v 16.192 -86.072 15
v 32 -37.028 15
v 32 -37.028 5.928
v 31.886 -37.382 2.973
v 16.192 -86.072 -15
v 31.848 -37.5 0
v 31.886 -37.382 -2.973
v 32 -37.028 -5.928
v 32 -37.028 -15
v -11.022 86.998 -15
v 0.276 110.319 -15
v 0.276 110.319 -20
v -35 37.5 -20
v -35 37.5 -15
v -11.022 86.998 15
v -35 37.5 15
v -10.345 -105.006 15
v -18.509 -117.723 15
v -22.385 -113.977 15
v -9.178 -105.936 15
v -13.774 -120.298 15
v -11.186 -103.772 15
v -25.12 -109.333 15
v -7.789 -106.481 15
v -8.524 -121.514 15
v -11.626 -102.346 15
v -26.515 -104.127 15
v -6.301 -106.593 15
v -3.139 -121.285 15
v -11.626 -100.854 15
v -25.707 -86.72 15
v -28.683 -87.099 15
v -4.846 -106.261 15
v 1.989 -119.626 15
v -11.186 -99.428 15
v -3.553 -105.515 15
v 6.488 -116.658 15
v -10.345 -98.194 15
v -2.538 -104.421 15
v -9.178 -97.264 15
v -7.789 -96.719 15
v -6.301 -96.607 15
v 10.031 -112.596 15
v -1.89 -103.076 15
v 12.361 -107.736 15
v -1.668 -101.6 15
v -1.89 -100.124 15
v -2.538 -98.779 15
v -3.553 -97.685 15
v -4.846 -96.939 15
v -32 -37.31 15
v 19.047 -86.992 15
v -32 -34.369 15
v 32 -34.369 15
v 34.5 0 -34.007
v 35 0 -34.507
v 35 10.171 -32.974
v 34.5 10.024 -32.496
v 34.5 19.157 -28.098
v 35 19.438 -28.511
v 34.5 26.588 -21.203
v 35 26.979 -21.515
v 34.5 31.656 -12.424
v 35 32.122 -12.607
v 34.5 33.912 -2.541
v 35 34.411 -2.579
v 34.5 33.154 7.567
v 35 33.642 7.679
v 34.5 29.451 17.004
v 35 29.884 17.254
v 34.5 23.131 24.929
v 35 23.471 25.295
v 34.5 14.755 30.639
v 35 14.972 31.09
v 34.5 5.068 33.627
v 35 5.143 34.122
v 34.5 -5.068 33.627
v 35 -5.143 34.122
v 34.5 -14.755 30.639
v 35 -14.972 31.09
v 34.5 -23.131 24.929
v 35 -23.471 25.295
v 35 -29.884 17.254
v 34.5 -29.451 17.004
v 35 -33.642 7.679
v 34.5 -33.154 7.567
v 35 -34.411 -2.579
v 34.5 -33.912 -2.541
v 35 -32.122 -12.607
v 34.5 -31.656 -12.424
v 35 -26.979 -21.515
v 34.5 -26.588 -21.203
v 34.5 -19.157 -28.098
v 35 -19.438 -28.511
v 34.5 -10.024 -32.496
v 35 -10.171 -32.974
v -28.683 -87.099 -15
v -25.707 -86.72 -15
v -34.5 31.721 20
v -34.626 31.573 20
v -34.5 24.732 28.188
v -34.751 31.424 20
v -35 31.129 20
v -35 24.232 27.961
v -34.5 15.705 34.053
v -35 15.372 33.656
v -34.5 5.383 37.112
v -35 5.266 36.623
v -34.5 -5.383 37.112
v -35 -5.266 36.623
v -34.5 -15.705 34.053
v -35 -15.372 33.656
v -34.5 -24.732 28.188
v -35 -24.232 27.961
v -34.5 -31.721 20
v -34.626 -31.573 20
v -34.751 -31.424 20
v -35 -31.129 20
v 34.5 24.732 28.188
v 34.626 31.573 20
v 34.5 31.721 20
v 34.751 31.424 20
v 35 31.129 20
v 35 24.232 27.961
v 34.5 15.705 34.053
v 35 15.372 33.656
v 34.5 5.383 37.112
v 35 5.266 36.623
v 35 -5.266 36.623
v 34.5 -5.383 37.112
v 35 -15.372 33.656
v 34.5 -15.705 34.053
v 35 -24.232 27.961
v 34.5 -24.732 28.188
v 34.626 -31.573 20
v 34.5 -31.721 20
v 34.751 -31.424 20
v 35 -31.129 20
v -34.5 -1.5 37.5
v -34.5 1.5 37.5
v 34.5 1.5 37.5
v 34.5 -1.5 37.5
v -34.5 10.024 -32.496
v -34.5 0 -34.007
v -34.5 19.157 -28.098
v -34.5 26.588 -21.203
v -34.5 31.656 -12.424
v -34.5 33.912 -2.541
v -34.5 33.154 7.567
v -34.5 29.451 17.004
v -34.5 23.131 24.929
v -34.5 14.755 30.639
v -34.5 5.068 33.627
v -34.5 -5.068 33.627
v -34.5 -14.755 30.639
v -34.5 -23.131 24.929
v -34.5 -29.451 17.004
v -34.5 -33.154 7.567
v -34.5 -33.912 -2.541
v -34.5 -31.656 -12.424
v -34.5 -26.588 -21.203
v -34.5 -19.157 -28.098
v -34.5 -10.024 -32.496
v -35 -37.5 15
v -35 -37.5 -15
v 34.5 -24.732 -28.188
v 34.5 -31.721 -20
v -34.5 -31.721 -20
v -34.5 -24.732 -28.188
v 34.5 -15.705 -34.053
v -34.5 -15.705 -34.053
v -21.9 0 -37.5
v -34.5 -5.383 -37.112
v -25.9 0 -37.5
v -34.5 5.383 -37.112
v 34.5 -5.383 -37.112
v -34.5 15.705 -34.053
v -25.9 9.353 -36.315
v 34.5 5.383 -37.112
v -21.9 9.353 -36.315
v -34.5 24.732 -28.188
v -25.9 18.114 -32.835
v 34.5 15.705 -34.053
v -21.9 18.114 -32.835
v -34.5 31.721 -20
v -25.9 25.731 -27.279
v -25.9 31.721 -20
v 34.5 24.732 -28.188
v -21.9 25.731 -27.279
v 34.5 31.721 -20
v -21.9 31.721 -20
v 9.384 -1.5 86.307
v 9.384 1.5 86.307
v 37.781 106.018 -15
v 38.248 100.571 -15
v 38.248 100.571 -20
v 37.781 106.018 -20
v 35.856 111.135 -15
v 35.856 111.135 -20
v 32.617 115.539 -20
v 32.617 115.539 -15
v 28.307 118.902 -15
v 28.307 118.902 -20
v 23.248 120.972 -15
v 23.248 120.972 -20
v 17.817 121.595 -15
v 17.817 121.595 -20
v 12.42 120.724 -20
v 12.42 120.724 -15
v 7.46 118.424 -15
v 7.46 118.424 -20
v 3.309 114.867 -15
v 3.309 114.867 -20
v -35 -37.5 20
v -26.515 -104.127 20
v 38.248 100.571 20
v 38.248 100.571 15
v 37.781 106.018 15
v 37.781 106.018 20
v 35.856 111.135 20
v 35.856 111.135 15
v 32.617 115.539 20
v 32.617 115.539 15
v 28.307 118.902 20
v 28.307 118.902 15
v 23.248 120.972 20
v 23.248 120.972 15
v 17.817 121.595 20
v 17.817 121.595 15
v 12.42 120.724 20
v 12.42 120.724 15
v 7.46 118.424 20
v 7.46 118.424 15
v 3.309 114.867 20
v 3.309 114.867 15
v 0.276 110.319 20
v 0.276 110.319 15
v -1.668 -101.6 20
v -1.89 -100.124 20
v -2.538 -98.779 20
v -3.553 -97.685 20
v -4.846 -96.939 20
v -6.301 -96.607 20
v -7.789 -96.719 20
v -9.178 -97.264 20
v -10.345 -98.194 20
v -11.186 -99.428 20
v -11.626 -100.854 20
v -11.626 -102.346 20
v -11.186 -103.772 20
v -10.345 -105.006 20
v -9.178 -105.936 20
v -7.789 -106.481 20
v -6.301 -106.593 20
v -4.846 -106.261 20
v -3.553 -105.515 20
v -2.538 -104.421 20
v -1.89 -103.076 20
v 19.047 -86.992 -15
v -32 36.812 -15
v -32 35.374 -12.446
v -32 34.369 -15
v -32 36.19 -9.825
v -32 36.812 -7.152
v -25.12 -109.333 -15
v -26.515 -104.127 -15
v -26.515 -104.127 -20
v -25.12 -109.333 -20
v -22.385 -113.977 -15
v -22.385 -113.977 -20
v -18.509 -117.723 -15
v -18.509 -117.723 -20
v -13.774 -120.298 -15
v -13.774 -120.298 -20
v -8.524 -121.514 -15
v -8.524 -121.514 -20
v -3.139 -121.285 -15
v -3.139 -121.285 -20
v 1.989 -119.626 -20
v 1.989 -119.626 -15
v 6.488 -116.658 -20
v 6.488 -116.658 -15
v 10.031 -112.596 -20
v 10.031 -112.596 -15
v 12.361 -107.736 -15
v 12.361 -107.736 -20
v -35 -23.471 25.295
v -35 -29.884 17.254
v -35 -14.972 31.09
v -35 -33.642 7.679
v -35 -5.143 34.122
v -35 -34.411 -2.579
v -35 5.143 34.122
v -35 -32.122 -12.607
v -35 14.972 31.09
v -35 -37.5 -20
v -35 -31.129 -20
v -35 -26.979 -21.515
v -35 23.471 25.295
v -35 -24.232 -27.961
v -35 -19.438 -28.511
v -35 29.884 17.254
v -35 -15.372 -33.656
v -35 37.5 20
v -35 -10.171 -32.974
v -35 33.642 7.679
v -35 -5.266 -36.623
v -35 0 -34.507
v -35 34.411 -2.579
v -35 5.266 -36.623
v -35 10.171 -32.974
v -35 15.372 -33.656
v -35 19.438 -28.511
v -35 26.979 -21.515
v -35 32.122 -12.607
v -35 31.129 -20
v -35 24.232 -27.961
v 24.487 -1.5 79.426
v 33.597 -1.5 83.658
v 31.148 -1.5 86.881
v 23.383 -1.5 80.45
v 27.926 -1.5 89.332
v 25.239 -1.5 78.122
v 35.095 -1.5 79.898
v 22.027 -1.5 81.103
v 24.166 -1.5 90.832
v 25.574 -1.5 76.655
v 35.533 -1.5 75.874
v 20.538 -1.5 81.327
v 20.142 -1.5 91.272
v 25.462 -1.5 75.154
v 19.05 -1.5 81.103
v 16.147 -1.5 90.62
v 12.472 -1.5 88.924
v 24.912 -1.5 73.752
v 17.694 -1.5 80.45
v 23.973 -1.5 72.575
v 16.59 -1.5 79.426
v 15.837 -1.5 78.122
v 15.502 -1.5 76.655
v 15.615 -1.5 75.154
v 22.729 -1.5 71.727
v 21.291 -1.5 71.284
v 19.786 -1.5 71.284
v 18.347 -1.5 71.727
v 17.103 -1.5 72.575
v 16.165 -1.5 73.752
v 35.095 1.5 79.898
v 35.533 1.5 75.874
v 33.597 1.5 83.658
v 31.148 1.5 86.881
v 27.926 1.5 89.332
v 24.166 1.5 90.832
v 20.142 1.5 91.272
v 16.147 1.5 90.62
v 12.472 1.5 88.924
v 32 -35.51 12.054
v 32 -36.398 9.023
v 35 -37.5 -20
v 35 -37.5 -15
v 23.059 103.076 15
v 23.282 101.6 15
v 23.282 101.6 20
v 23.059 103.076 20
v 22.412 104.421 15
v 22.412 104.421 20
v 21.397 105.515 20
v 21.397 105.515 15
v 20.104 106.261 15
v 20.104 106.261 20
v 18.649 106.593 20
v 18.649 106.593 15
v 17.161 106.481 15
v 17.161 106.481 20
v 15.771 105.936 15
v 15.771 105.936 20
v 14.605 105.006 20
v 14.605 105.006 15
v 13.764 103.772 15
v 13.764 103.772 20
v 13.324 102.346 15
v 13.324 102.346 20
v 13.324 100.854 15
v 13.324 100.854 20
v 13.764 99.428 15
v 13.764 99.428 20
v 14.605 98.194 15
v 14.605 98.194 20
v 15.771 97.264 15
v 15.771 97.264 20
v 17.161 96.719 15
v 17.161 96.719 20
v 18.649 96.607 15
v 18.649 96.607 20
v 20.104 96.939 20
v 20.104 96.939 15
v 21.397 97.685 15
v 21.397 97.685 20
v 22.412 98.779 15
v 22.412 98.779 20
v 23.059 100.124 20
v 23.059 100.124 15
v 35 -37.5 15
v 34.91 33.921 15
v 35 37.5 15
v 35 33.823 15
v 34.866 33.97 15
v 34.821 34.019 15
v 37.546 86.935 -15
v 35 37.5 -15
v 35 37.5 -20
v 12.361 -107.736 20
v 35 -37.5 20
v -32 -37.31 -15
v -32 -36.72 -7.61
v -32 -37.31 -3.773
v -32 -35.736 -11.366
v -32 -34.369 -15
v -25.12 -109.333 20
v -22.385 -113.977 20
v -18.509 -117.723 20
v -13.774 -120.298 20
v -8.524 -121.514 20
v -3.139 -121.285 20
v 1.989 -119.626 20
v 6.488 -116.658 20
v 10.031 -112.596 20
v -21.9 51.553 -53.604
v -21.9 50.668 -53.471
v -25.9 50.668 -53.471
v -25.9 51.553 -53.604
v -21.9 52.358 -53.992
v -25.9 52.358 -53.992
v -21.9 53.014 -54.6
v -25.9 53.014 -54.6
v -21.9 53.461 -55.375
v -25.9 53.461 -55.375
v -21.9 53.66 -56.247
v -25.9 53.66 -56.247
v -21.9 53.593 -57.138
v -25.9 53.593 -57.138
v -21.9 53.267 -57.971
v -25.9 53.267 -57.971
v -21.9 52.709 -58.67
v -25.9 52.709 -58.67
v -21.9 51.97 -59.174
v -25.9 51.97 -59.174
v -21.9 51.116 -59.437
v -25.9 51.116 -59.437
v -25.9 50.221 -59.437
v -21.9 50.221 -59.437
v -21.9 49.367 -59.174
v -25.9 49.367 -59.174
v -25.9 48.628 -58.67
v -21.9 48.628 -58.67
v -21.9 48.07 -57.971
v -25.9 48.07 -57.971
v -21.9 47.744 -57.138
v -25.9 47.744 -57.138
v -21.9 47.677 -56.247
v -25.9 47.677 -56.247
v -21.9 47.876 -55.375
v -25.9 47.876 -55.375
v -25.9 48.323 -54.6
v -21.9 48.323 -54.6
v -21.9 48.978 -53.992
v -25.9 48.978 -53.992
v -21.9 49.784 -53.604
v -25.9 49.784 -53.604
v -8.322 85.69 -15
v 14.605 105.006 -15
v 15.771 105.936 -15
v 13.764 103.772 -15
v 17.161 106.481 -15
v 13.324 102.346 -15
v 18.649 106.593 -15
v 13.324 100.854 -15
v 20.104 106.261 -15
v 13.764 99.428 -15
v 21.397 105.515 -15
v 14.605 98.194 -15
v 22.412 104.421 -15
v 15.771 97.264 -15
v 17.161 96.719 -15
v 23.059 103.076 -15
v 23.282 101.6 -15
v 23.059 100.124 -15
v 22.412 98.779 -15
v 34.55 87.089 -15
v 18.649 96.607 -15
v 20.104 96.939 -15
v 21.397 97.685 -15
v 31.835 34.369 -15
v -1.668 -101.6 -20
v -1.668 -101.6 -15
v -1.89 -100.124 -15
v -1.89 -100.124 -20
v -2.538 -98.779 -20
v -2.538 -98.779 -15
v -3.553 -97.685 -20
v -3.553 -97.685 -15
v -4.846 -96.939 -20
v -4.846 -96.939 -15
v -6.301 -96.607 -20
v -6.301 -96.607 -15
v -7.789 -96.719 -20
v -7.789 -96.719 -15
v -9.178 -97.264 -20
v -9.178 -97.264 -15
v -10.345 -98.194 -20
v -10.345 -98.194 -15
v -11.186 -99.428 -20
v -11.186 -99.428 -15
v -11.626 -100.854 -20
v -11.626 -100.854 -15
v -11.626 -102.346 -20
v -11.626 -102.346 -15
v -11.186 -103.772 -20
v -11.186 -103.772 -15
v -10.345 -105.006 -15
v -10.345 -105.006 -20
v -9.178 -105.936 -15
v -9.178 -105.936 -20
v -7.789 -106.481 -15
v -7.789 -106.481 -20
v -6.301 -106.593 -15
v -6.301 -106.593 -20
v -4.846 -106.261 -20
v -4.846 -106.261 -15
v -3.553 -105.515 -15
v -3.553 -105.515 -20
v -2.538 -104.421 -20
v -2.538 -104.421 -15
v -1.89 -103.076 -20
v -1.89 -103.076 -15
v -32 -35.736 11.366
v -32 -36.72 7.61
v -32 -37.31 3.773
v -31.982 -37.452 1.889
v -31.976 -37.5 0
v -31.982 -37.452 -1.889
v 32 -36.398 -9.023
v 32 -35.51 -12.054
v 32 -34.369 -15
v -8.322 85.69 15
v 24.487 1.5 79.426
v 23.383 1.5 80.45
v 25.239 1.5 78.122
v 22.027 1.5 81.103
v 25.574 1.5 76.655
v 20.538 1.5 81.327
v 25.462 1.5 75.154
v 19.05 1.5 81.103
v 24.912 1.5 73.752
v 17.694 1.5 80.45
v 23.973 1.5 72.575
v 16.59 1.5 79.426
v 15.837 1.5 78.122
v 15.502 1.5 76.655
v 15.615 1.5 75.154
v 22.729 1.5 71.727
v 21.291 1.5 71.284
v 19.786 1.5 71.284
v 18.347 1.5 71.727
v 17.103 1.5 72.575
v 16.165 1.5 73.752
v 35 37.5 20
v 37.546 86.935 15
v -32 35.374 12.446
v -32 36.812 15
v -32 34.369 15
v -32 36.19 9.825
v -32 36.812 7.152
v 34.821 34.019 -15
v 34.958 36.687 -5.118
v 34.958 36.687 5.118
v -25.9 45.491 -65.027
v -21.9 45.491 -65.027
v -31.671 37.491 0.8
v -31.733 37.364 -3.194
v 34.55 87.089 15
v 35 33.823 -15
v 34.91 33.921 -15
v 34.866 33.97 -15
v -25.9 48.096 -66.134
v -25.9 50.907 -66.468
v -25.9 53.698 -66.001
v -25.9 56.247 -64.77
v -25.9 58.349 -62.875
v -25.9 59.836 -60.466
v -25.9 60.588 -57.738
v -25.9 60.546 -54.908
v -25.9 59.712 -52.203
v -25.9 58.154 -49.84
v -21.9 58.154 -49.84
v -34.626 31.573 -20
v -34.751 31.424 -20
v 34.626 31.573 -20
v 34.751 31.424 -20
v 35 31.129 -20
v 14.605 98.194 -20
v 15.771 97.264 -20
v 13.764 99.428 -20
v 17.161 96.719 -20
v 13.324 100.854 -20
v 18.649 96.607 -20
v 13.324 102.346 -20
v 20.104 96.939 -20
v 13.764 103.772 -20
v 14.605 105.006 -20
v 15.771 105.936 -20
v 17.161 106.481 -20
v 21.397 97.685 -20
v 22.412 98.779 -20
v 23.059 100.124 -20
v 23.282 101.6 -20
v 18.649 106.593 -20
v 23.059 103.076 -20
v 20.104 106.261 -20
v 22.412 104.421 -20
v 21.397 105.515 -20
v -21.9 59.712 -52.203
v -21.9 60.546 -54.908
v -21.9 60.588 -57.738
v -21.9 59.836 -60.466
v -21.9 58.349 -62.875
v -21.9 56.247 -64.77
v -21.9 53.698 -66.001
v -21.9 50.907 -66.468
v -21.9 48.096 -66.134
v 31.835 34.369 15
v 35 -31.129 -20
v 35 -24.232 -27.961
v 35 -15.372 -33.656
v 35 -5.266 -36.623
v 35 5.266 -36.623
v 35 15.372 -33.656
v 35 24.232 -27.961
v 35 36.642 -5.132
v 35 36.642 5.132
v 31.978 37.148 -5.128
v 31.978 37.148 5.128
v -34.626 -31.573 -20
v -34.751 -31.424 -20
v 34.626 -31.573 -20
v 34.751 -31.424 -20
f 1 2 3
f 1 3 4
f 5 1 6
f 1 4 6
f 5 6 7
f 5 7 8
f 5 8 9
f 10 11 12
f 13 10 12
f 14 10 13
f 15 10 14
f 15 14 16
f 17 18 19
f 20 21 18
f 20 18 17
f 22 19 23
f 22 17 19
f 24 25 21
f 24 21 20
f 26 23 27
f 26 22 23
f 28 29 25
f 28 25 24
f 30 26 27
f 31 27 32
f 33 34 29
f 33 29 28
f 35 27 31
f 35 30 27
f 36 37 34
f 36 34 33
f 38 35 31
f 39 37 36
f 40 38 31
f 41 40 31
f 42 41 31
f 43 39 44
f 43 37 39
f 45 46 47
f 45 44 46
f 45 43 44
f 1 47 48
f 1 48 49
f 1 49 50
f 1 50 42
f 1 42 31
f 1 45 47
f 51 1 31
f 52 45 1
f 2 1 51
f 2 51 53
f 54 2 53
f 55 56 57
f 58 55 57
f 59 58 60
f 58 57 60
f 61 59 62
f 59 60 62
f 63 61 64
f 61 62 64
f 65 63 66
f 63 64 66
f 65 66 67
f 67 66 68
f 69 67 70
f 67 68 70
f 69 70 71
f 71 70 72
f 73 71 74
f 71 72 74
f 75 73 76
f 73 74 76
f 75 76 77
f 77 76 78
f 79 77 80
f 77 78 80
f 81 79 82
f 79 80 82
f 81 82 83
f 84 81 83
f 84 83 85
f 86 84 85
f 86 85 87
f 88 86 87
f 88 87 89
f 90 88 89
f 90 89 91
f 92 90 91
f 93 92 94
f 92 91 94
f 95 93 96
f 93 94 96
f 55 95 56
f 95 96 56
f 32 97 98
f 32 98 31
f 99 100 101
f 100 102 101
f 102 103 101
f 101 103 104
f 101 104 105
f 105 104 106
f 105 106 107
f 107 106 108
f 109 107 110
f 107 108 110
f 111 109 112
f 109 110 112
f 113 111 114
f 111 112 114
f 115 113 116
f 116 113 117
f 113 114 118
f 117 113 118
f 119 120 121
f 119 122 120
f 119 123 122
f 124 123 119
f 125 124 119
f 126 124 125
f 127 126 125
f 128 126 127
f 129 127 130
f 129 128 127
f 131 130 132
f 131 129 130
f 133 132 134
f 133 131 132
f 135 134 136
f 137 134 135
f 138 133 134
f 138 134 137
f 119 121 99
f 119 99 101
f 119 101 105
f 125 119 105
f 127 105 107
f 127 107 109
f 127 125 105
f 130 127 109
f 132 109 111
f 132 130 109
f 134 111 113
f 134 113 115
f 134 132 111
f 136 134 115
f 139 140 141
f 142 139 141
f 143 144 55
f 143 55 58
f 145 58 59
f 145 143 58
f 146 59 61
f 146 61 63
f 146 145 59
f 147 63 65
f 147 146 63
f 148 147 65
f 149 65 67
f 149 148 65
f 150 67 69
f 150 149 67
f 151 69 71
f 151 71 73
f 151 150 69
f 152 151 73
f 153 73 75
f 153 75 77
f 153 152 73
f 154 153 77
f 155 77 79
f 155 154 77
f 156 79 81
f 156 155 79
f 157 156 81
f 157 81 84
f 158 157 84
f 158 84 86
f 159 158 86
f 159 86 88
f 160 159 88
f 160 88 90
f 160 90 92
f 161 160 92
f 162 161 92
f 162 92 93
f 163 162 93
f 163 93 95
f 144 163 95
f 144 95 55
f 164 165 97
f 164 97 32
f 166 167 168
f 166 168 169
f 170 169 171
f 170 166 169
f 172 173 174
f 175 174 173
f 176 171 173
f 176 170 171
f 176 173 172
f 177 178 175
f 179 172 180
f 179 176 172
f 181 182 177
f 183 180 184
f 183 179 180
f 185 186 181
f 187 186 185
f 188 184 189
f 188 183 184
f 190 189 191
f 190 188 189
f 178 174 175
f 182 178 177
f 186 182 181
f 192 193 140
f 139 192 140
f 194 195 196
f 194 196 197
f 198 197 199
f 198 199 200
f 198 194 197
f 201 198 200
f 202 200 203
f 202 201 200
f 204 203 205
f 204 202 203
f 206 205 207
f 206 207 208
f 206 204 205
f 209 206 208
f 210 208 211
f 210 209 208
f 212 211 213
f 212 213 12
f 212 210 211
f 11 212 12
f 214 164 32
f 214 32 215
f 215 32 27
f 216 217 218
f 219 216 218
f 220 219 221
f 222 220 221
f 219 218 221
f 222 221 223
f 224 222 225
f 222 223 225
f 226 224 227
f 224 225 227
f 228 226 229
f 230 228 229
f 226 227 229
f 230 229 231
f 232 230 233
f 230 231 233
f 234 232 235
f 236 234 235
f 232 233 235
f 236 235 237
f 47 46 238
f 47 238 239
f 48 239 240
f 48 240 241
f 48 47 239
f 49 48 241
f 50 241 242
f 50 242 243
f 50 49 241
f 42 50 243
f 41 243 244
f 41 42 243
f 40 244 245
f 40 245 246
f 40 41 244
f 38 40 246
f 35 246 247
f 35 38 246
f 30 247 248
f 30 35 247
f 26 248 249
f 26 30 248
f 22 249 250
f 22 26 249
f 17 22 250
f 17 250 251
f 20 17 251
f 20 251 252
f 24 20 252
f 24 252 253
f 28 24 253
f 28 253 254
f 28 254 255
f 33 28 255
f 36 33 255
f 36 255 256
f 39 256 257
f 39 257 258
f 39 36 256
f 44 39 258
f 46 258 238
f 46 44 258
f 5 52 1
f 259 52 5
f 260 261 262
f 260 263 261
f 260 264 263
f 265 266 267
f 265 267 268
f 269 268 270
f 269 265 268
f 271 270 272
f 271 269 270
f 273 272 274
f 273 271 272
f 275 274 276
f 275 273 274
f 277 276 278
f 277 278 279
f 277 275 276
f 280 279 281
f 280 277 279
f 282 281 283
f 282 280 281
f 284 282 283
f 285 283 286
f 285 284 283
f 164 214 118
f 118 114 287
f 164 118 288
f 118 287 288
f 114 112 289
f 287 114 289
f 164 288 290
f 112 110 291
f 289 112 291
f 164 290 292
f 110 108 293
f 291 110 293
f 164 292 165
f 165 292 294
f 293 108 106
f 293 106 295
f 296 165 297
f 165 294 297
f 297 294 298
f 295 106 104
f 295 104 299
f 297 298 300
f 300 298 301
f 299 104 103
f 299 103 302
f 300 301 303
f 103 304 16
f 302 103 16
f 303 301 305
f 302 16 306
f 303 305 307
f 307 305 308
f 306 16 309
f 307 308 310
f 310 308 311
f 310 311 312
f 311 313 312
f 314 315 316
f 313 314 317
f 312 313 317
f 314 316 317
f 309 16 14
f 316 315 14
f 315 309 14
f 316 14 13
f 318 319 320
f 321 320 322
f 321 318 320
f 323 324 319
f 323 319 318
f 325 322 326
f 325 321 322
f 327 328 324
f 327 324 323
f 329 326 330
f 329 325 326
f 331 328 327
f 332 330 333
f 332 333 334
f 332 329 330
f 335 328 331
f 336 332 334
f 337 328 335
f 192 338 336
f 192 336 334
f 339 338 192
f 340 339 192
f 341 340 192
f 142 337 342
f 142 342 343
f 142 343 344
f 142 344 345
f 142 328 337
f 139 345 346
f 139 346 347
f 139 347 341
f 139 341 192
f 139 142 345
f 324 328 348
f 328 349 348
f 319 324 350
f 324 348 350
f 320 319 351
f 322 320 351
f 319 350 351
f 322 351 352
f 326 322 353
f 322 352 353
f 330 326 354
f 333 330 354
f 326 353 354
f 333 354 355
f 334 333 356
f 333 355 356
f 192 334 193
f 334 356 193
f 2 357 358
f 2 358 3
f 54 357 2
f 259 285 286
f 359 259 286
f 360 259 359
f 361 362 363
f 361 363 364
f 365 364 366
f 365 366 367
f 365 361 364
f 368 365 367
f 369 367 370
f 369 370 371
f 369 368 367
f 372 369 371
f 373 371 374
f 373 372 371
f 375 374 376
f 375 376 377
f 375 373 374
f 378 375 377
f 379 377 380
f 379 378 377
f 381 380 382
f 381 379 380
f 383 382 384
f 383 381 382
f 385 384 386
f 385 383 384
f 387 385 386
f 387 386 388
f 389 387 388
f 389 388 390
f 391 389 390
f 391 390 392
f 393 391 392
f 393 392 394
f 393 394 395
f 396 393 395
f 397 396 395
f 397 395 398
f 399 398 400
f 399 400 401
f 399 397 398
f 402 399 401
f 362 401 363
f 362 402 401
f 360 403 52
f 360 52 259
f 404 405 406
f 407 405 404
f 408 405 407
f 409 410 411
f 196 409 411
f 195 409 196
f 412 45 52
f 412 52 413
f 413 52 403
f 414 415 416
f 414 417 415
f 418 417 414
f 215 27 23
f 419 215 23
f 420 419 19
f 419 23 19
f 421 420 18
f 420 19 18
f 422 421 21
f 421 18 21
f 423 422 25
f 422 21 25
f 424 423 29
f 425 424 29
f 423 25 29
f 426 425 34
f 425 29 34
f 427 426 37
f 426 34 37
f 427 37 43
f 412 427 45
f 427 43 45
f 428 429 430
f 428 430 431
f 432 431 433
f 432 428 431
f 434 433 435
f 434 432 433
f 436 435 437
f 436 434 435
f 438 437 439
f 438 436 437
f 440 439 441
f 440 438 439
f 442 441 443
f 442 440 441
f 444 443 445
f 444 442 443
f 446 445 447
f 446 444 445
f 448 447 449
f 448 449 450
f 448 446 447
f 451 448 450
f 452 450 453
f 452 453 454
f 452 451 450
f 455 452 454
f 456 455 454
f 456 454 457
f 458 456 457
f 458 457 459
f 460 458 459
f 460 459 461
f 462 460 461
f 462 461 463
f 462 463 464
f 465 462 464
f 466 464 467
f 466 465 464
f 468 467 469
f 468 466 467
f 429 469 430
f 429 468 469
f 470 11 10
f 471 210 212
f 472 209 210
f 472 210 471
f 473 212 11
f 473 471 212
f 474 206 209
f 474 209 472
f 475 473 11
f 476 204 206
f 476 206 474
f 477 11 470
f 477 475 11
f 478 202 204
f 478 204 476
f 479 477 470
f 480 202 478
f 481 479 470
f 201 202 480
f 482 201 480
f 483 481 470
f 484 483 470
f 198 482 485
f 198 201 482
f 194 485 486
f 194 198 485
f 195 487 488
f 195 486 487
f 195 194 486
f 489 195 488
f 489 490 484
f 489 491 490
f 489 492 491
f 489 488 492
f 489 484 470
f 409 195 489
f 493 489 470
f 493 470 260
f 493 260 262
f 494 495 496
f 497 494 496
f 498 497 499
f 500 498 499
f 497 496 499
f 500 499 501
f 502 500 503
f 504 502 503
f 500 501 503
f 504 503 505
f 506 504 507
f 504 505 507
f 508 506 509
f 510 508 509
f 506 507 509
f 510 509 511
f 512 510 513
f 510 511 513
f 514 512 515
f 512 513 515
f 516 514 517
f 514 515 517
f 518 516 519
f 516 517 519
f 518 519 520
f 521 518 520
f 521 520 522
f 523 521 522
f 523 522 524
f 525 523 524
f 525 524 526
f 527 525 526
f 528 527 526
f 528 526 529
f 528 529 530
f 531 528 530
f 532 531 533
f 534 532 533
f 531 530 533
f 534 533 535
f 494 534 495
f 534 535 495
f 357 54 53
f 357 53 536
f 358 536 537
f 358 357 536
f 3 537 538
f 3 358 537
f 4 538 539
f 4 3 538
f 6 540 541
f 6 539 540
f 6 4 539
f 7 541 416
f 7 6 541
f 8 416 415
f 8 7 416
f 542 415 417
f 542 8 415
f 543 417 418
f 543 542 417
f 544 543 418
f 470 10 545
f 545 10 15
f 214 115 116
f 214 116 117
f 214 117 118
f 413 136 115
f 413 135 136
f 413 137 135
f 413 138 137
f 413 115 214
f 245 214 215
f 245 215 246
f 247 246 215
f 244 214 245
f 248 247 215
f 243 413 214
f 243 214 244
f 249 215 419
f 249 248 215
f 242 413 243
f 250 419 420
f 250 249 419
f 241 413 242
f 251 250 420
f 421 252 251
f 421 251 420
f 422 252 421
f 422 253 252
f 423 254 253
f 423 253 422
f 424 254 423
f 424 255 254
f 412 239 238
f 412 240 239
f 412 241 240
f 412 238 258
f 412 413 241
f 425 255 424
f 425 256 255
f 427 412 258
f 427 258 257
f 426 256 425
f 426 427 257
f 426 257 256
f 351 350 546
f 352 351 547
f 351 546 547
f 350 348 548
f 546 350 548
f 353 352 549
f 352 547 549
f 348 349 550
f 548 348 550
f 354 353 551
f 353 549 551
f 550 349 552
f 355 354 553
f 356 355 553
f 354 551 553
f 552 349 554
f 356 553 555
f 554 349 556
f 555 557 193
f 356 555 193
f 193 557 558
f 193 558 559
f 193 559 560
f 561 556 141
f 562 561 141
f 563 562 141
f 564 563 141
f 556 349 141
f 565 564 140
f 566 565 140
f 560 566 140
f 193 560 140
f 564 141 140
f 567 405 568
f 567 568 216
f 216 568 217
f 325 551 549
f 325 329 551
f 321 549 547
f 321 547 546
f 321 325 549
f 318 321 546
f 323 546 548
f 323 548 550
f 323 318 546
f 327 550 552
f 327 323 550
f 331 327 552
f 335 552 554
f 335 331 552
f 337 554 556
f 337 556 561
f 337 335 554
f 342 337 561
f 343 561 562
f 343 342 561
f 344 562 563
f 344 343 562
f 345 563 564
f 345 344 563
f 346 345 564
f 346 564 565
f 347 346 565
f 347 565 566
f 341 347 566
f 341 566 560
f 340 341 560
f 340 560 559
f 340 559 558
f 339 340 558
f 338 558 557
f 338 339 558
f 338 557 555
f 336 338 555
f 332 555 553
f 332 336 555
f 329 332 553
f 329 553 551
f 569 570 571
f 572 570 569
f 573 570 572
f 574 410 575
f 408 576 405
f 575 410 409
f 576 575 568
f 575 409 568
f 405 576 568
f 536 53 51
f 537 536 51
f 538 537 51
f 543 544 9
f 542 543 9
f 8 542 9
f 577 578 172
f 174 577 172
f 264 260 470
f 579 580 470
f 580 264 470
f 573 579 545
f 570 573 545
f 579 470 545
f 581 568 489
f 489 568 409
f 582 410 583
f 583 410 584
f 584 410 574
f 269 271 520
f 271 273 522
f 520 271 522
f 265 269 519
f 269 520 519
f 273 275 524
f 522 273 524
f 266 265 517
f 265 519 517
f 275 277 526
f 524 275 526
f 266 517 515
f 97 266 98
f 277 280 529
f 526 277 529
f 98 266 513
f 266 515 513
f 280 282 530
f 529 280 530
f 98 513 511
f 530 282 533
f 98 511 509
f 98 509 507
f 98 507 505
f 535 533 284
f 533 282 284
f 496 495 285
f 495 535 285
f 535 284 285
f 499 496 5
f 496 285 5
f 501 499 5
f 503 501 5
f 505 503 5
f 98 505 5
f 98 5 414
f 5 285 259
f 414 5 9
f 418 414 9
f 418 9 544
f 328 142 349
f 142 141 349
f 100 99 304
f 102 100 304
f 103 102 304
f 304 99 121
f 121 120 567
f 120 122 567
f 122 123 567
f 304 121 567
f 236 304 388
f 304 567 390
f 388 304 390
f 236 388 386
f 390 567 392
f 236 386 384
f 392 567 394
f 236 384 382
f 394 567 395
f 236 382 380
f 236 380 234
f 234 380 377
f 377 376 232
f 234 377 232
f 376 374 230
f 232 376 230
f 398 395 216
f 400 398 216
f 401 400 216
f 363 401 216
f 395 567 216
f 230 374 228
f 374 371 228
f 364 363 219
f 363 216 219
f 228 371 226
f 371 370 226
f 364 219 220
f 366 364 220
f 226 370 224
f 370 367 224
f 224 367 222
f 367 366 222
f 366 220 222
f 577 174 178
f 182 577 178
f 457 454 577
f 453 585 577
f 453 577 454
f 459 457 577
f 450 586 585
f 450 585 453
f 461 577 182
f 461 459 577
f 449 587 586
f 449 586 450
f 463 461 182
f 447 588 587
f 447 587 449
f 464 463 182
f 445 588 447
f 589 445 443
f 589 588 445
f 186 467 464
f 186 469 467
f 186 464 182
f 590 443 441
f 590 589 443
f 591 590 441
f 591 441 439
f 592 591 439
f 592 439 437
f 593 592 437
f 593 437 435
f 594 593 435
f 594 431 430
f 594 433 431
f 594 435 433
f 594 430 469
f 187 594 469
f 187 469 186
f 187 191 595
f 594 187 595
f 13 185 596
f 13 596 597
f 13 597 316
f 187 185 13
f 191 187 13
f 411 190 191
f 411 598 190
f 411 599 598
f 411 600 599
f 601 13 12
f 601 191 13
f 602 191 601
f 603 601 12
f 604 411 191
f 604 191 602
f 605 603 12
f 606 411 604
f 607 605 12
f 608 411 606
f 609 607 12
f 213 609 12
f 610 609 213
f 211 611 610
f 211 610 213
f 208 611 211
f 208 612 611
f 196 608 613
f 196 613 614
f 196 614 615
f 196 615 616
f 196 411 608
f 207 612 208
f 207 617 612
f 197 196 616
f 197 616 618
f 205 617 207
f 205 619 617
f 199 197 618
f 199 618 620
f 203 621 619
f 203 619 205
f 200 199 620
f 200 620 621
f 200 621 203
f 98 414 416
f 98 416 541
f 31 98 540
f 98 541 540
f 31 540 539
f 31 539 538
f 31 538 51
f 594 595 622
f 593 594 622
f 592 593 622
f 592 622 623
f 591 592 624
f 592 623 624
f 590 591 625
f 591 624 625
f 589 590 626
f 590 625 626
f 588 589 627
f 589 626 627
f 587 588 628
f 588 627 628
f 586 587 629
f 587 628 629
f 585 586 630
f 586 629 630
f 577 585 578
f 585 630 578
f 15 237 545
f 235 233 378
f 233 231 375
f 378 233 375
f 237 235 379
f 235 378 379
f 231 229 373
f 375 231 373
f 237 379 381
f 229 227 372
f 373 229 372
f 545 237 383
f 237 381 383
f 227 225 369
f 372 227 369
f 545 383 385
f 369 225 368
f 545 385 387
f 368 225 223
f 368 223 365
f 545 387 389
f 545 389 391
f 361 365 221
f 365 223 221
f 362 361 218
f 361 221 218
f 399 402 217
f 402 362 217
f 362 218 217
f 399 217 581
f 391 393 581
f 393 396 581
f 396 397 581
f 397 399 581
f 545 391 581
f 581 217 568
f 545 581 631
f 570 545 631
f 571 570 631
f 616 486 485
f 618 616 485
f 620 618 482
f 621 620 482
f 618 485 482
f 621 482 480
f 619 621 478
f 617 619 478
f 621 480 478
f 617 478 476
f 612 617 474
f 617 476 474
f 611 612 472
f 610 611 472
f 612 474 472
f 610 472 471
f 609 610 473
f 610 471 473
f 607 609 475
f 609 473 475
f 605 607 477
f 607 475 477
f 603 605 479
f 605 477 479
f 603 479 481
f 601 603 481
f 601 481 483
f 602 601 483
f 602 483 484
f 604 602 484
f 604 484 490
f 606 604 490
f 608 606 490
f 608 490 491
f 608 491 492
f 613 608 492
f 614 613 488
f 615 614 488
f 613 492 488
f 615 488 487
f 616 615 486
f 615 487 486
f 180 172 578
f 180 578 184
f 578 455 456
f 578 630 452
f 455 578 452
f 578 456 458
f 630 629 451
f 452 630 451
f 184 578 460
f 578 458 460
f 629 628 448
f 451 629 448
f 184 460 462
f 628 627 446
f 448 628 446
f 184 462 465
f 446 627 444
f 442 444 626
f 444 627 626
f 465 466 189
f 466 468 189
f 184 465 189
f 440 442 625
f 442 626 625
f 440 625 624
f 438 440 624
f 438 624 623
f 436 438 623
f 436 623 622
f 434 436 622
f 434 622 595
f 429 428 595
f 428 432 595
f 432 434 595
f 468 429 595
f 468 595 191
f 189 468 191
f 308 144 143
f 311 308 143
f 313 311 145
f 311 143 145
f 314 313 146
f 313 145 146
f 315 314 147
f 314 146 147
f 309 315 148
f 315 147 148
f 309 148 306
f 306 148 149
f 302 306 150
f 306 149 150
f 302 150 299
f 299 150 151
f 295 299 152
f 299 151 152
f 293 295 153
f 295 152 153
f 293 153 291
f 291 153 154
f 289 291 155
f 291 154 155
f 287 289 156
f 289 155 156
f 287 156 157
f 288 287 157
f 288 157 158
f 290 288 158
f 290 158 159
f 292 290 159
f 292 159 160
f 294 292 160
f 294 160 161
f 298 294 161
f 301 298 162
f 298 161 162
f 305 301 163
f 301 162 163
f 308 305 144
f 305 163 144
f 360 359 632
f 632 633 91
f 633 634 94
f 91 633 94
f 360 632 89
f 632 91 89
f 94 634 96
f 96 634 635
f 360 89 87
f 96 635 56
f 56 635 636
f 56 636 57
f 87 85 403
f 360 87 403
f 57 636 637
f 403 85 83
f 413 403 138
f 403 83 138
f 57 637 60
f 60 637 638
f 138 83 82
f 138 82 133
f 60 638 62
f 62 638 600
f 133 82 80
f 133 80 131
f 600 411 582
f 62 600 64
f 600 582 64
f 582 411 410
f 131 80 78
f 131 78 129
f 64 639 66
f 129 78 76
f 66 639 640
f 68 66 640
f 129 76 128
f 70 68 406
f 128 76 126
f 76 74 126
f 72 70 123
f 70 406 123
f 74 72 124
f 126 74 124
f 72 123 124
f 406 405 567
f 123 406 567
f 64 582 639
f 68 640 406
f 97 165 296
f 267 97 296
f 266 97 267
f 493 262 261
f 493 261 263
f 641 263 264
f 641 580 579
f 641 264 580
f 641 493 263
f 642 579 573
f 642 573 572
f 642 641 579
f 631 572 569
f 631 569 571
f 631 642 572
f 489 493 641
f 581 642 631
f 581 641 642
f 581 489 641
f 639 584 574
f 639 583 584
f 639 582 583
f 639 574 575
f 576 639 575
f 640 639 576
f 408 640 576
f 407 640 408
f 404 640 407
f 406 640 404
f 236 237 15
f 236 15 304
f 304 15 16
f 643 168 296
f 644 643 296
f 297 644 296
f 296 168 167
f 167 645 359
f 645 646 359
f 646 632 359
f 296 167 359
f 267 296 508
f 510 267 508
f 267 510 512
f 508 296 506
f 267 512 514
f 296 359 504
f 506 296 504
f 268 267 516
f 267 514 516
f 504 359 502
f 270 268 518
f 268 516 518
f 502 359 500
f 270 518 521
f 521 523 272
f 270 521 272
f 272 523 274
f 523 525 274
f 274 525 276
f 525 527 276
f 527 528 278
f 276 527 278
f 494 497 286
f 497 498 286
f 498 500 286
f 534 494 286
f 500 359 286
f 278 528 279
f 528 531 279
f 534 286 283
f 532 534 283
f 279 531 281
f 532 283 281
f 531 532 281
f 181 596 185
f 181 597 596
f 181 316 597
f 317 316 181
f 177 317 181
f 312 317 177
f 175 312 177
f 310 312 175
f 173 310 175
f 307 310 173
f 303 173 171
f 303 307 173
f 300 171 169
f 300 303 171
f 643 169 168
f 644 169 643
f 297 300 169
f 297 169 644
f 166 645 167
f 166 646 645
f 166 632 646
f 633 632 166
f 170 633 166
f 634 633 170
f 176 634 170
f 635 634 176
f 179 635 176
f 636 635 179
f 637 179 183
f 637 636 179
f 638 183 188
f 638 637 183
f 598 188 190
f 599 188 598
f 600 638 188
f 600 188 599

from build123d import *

# Parameters (mm, degrees)
SKETCH1_R             = 37.5
SKETCH1_R_2           = 34.007
BOSS_EXTRUDE1_DEPTH   = 35
BOSS_EXTRUDE2_START   = 15
SKETCH4_R             = 5.007
BOSS_EXTRUDE2_DEPTH   = 5
BOSS_EXTRUDE2_2_DEPTH = 5
BOSS_EXTRUDE3_START   = -15
SKETCH5_R             = 5.007
BOSS_EXTRUDE3_DEPTH   = 5
BOSS_EXTRUDE3_2_DEPTH = 5
BOSS_EXTRUDE4_DEPTH   = 70
CHAMFER1_SIZE         = 0.5
CHAMFER2_SIZE         = 0.5
BOSS_EXTRUDE8_DEPTH   = 3
SKETCH13_W            = 30
SKETCH13_H            = 55
BOSS_EXTRUDE9_DEPTH   = 3
BOSS_EXTRUDE10_DEPTH  = 3
SKETCH15_W            = 30
SKETCH15_H            = 50
BOSS_EXTRUDE11_DEPTH  = 3
BOSS_EXTRUDE12_DEPTH  = 3
SKETCH17_W            = 30
SKETCH17_H            = 52
BOSS_EXTRUDE13_DEPTH  = 3
BOSS_EXTRUDE14_DEPTH  = 3
SKETCH22_R            = 5.05
BOSS_EXTRUDE16_DEPTH  = 1.5
BOSS_EXTRUDE17_START  = -4
SKETCH23_R            = 3
BOSS_EXTRUDE17_DEPTH  = 4


with BuildPart() as part:
    # Sketch1 → Boss-Extrude1 (new, symmetric)
    with BuildSketch(Plane(origin=(0, 0, 0), x_dir=(0, 0, -1), z_dir=(1, 0, 0))):
        Circle(SKETCH1_R)
        Circle(SKETCH1_R_2, mode=Mode.SUBTRACT)
    extrude(amount=BOSS_EXTRUDE1_DEPTH, both=True)



with BuildPart() as body_2:
    # Sketch4 → Boss-Extrude2 (new body)
    with BuildSketch(Plane.XY.offset(BOSS_EXTRUDE2_START)):
        with BuildLine():
            Line((0.275652512, 110.319327951), (-35, 37.5))
            Line((-35, 37.5), (35, 37.5))
            Line((35, 37.5), (38.248437197, 100.571279081))
            ThreePointArc((38.248437197, 100.571279081), (23.247893056, 120.971872737), (0.275652512, 110.319327951))
        make_face()
        with Locations((18.274911388, 101.6)):
            Circle(SKETCH4_R, mode=Mode.SUBTRACT)
    extrude(amount=BOSS_EXTRUDE2_DEPTH)


with BuildPart() as body_3:
    # Sketch4 → Boss-Extrude2 2 (new body)
    with BuildSketch(Plane.XY.offset(BOSS_EXTRUDE2_START)):
        with BuildLine():
            Line((-35, -37.5), (-26.514661672, -104.126718952))
            ThreePointArc((-26.514661672, -104.126718952), (-8.523708177, -121.514365429), (12.360633821, -107.735798124))
            Line((12.360633821, -107.735798124), (35, -37.5))
            Line((35, -37.5), (-35, -37.5))
        make_face()
        with Locations((-6.674911388, -101.6)):
            Circle(SKETCH4_R, mode=Mode.SUBTRACT)
    extrude(amount=BOSS_EXTRUDE2_2_DEPTH)


with BuildPart() as body_4:
    # Sketch5 → Boss-Extrude3 (new body)
    with BuildSketch(Plane.XY.offset(BOSS_EXTRUDE3_START)):
        with BuildLine():
            Line((35, -37.5), (-35, -37.5))
            Line((-35, -37.5), (-26.514661672, -104.126718952))
            ThreePointArc((-26.514661672, -104.126718952), (-8.523708177, -121.514365429), (12.360633821, -107.735798124))
            Line((12.360633821, -107.735798124), (35, -37.5))
        make_face()
        with Locations((-6.674911388, -101.6)):
            Circle(SKETCH5_R, mode=Mode.SUBTRACT)
    extrude(amount=-BOSS_EXTRUDE3_DEPTH)


with BuildPart() as body_5:
    # Sketch5 → Boss-Extrude3 2 (new body)
    with BuildSketch(Plane.XY.offset(BOSS_EXTRUDE3_START)):
        with BuildLine():
            Line((35, 37.5), (38.248437197, 100.571279081))
            ThreePointArc((38.248437197, 100.571279081), (23.247893056, 120.971872737), (0.275652512, 110.319327951))
            Line((0.275652512, 110.319327951), (-35, 37.5))
            Line((-35, 37.5), (35, 37.5))
        make_face()
        with Locations((18.274911388, 101.6)):
            Circle(SKETCH5_R, mode=Mode.SUBTRACT)
    extrude(amount=-BOSS_EXTRUDE3_2_DEPTH)


with BuildPart() as part_1:
    add(part.part)

    add(body_2.part)  # Boss-Extrude4 merges body 2

    add(body_3.part)  # Boss-Extrude4 merges body 3

    add(body_4.part)  # Boss-Extrude4 merges body 4

    add(body_5.part)  # Boss-Extrude4 merges body 5
    # Sketch6 → Boss-Extrude4 (add)
    with BuildSketch(Plane(origin=(35, 0, 0), x_dir=(0, 0, -1), z_dir=(1, 0, 0))):
        with BuildLine():
            Line((20, -37.5), (15, -37.5))
            Line((15, -37.5), (15, -34.369317712))
            ThreePointArc((15, -34.369317712), (17.550008803, -33.139812779), (20, -31.721443851))
            Line((20, -31.721443851), (20, -37.5))
        make_face()
        with BuildLine():
            Line((-20, -37.5), (-15, -37.5))
            Line((-15, -37.5), (-15, -34.369317712))
            ThreePointArc((-15, -34.369317712), (-17.550008803, -33.139812779), (-20, -31.721443851))
            Line((-20, -31.721443851), (-20, -37.5))
        make_face()
        with BuildLine():
            Line((20, 37.5), (15, 37.5))
            Line((15, 37.5), (15, 34.369317712))
            ThreePointArc((15, 34.369317712), (17.550008803, 33.139812779), (20, 31.721443851))
            Line((20, 31.721443851), (20, 37.5))
        make_face()
        with BuildLine():
            Line((-20, 37.5), (-15, 37.5))
            Line((-15, 37.5), (-15, 34.369317712))
            ThreePointArc((-15, 34.369317712), (-17.550008803, 33.139812779), (-20, 31.721443851))
            Line((-20, 31.721443851), (-20, 37.5))
        make_face()
    extrude(amount=-BOSS_EXTRUDE4_DEPTH)

    # Chamfer1
    chamfer1_edges = [part_1.edges().sort_by_distance(p)[0] for p in [
        (35, -37.5, 0),
        (35, 37.5, 0),
        (35, 0, 34.007),
        (35, 0, 37.5),
        (35, 0, -37.5),
    ]]
    chamfer(chamfer1_edges, length=CHAMFER1_SIZE)

    # Chamfer2
    chamfer2_edges = [part_1.edges().sort_by_distance(p)[0] for p in [
        (-35, 0, -37.5),
        (-35, -37.5, 0),
        (-35, 37.5, 0),
        (-35, 0, 34.007),
        (-35, 0, 37.5),
    ]]
    chamfer(chamfer2_edges, length=CHAMFER2_SIZE)

    # Sketch12 → Boss-Extrude8 (add)
    with BuildSketch(Plane(origin=(32.981103177, -1.69866608, 0), x_dir=(0, 0, -1), z_dir=(0.9986762904840372, -0.05143604597014742, 0))):
        with BuildLine():
            Line((-15, 39.250622502), (-15, 88.751284357))
            Line((-15, 88.751284357), (15, 88.751284357))
            Line((15, 88.751284357), (15, 39.250622502))
            Line((15, 39.250622502), (15, 35.578558741))
            add(Edge.make_bspline(
                [(15, 35.578558741), (0, 42.22201753), (-15, 35.578558741)],
                knots=[1.153374055, 1.153374055, 1.153374055, 1.988218598, 1.988218598, 1.988218598], degree=2, weights=[1, 0.914137001, 1]))
            Line((-15, 35.578558741), (-15, 39.250622502))
        make_face()
    extrude(amount=-BOSS_EXTRUDE8_DEPTH)

    # Sketch13 → Boss-Extrude9 (add)
    with BuildSketch(Plane(origin=(-43.060925602, 20.859877331, 0), x_dir=(0, 0, 1), z_dir=(-0.8999629437964011, 0.435966397550678, 0))):
        with Locations((0, 45.989786478)):
            Rectangle(SKETCH13_W, SKETCH13_H)
    extrude(amount=-BOSS_EXTRUDE9_DEPTH)

    # Sketch14 → Boss-Extrude10 (add)
    with BuildSketch(Plane.ZY.offset(35)):
        with BuildLine():
            Line((15, 37.5), (15, 33.823069051))
            ThreePointArc((15, 33.823069051), (0, 37), (-15, 33.823069051))
            Line((-15, 33.823069051), (-15, 37.5))
            Line((-15, 37.5), (15, 37.5))
        make_face()
    extrude(amount=-BOSS_EXTRUDE10_DEPTH)

    # Sketch15 → Boss-Extrude11 (add)
    with BuildSketch(Plane(origin=(-39.141011091, -4.984857829, 0), x_dir=(0, 0, 1), z_dir=(-0.9919875142057744, -0.1263359476152713, 0))):
        with Locations((0, -57.777773616)):
            Rectangle(SKETCH15_W, SKETCH15_H)
    extrude(amount=-BOSS_EXTRUDE11_DEPTH)

    # Sketch16 → Boss-Extrude12 (add)
    with BuildSketch(Plane.ZY.offset(35)):
        with BuildLine():
            Line((15, -37.5), (-15, -37.5))
            Line((-15, -37.5), (-15, -33.823069051))
            ThreePointArc((-15, -33.823069051), (0, -37), (15, -33.823069051))
            Line((15, -33.823069051), (15, -37.5))
        make_face()
    extrude(amount=-BOSS_EXTRUDE12_DEPTH)

    # Sketch17 → Boss-Extrude13 (add)
    with BuildSketch(Plane(origin=(42.655635488, -13.749349722, 0), x_dir=(0, 0, -1), z_dir=(0.9517772604145124, -0.30678990621897206, 0))):
        with Locations((0, -50.954000548)):
            Rectangle(SKETCH17_W, SKETCH17_H)
    extrude(amount=-BOSS_EXTRUDE13_DEPTH)

    # Sketch19 → Boss-Extrude14 (add)
    with BuildSketch(Plane(origin=(35, 0, 0), x_dir=(0, 0, -1), z_dir=(1, 0, 0))):
        with BuildLine():
            Line((-15, -37.5), (-15, -33.823069051))
            ThreePointArc((-15, -33.823069051), (0, -37), (15, -33.823069051))
            Line((15, -33.823069051), (15, -37.5))
            Line((15, -37.5), (-15, -37.5))
        make_face()
    extrude(amount=-BOSS_EXTRUDE14_DEPTH)

    # Sketch23 → Boss-Extrude17 (add)
    with BuildSketch(Plane.ZY.offset(25.9).offset(BOSS_EXTRUDE17_START)):
        with BuildLine():
            Line((-20, 31.721443851), (-49.840187884, 58.154004142))
            ThreePointArc((-49.840187884, 58.154004142), (-62.874907522, 58.34887951), (-65.026564496, 45.491497789))
            Line((-65.026564496, 45.491497789), (-37.5, 0))
            ThreePointArc((-37.5, 0), (-32.834813841, 18.114220933), (-20, 31.721443851))
        make_face()
        with Locations((-56.470917013, 50.668455984)):
            Circle(SKETCH23_R, mode=Mode.SUBTRACT)
    extrude(amount=BOSS_EXTRUDE17_DEPTH)


with BuildPart() as body_2_2:
    # Sketch22 → Boss-Extrude16 (new, symmetric)
    with BuildSketch(Plane(origin=(0, 0, 0), x_dir=(1, 0, 0), z_dir=(0, 1, 0))):
        with BuildLine():
            Line((-34.5, -37.5), (34.5, -37.5))
            Line((34.5, -37.5), (35.532926057, -75.873692154))
            ThreePointArc((35.532926057, -75.873692154), (26.096971037, -90.209351988), (9.384212743, -86.306519652))
            Line((9.384212743, -86.306519652), (-34.5, -37.5))
        make_face()
        with Locations(Location((20.538357267, -76.277309318, 0), (0, 0, 270))):
            Circle(SKETCH22_R, mode=Mode.SUBTRACT)
    extrude(amount=BOSS_EXTRUDE16_DEPTH, both=True)


solid = Compound([part_1.part, body_2_2.part])
